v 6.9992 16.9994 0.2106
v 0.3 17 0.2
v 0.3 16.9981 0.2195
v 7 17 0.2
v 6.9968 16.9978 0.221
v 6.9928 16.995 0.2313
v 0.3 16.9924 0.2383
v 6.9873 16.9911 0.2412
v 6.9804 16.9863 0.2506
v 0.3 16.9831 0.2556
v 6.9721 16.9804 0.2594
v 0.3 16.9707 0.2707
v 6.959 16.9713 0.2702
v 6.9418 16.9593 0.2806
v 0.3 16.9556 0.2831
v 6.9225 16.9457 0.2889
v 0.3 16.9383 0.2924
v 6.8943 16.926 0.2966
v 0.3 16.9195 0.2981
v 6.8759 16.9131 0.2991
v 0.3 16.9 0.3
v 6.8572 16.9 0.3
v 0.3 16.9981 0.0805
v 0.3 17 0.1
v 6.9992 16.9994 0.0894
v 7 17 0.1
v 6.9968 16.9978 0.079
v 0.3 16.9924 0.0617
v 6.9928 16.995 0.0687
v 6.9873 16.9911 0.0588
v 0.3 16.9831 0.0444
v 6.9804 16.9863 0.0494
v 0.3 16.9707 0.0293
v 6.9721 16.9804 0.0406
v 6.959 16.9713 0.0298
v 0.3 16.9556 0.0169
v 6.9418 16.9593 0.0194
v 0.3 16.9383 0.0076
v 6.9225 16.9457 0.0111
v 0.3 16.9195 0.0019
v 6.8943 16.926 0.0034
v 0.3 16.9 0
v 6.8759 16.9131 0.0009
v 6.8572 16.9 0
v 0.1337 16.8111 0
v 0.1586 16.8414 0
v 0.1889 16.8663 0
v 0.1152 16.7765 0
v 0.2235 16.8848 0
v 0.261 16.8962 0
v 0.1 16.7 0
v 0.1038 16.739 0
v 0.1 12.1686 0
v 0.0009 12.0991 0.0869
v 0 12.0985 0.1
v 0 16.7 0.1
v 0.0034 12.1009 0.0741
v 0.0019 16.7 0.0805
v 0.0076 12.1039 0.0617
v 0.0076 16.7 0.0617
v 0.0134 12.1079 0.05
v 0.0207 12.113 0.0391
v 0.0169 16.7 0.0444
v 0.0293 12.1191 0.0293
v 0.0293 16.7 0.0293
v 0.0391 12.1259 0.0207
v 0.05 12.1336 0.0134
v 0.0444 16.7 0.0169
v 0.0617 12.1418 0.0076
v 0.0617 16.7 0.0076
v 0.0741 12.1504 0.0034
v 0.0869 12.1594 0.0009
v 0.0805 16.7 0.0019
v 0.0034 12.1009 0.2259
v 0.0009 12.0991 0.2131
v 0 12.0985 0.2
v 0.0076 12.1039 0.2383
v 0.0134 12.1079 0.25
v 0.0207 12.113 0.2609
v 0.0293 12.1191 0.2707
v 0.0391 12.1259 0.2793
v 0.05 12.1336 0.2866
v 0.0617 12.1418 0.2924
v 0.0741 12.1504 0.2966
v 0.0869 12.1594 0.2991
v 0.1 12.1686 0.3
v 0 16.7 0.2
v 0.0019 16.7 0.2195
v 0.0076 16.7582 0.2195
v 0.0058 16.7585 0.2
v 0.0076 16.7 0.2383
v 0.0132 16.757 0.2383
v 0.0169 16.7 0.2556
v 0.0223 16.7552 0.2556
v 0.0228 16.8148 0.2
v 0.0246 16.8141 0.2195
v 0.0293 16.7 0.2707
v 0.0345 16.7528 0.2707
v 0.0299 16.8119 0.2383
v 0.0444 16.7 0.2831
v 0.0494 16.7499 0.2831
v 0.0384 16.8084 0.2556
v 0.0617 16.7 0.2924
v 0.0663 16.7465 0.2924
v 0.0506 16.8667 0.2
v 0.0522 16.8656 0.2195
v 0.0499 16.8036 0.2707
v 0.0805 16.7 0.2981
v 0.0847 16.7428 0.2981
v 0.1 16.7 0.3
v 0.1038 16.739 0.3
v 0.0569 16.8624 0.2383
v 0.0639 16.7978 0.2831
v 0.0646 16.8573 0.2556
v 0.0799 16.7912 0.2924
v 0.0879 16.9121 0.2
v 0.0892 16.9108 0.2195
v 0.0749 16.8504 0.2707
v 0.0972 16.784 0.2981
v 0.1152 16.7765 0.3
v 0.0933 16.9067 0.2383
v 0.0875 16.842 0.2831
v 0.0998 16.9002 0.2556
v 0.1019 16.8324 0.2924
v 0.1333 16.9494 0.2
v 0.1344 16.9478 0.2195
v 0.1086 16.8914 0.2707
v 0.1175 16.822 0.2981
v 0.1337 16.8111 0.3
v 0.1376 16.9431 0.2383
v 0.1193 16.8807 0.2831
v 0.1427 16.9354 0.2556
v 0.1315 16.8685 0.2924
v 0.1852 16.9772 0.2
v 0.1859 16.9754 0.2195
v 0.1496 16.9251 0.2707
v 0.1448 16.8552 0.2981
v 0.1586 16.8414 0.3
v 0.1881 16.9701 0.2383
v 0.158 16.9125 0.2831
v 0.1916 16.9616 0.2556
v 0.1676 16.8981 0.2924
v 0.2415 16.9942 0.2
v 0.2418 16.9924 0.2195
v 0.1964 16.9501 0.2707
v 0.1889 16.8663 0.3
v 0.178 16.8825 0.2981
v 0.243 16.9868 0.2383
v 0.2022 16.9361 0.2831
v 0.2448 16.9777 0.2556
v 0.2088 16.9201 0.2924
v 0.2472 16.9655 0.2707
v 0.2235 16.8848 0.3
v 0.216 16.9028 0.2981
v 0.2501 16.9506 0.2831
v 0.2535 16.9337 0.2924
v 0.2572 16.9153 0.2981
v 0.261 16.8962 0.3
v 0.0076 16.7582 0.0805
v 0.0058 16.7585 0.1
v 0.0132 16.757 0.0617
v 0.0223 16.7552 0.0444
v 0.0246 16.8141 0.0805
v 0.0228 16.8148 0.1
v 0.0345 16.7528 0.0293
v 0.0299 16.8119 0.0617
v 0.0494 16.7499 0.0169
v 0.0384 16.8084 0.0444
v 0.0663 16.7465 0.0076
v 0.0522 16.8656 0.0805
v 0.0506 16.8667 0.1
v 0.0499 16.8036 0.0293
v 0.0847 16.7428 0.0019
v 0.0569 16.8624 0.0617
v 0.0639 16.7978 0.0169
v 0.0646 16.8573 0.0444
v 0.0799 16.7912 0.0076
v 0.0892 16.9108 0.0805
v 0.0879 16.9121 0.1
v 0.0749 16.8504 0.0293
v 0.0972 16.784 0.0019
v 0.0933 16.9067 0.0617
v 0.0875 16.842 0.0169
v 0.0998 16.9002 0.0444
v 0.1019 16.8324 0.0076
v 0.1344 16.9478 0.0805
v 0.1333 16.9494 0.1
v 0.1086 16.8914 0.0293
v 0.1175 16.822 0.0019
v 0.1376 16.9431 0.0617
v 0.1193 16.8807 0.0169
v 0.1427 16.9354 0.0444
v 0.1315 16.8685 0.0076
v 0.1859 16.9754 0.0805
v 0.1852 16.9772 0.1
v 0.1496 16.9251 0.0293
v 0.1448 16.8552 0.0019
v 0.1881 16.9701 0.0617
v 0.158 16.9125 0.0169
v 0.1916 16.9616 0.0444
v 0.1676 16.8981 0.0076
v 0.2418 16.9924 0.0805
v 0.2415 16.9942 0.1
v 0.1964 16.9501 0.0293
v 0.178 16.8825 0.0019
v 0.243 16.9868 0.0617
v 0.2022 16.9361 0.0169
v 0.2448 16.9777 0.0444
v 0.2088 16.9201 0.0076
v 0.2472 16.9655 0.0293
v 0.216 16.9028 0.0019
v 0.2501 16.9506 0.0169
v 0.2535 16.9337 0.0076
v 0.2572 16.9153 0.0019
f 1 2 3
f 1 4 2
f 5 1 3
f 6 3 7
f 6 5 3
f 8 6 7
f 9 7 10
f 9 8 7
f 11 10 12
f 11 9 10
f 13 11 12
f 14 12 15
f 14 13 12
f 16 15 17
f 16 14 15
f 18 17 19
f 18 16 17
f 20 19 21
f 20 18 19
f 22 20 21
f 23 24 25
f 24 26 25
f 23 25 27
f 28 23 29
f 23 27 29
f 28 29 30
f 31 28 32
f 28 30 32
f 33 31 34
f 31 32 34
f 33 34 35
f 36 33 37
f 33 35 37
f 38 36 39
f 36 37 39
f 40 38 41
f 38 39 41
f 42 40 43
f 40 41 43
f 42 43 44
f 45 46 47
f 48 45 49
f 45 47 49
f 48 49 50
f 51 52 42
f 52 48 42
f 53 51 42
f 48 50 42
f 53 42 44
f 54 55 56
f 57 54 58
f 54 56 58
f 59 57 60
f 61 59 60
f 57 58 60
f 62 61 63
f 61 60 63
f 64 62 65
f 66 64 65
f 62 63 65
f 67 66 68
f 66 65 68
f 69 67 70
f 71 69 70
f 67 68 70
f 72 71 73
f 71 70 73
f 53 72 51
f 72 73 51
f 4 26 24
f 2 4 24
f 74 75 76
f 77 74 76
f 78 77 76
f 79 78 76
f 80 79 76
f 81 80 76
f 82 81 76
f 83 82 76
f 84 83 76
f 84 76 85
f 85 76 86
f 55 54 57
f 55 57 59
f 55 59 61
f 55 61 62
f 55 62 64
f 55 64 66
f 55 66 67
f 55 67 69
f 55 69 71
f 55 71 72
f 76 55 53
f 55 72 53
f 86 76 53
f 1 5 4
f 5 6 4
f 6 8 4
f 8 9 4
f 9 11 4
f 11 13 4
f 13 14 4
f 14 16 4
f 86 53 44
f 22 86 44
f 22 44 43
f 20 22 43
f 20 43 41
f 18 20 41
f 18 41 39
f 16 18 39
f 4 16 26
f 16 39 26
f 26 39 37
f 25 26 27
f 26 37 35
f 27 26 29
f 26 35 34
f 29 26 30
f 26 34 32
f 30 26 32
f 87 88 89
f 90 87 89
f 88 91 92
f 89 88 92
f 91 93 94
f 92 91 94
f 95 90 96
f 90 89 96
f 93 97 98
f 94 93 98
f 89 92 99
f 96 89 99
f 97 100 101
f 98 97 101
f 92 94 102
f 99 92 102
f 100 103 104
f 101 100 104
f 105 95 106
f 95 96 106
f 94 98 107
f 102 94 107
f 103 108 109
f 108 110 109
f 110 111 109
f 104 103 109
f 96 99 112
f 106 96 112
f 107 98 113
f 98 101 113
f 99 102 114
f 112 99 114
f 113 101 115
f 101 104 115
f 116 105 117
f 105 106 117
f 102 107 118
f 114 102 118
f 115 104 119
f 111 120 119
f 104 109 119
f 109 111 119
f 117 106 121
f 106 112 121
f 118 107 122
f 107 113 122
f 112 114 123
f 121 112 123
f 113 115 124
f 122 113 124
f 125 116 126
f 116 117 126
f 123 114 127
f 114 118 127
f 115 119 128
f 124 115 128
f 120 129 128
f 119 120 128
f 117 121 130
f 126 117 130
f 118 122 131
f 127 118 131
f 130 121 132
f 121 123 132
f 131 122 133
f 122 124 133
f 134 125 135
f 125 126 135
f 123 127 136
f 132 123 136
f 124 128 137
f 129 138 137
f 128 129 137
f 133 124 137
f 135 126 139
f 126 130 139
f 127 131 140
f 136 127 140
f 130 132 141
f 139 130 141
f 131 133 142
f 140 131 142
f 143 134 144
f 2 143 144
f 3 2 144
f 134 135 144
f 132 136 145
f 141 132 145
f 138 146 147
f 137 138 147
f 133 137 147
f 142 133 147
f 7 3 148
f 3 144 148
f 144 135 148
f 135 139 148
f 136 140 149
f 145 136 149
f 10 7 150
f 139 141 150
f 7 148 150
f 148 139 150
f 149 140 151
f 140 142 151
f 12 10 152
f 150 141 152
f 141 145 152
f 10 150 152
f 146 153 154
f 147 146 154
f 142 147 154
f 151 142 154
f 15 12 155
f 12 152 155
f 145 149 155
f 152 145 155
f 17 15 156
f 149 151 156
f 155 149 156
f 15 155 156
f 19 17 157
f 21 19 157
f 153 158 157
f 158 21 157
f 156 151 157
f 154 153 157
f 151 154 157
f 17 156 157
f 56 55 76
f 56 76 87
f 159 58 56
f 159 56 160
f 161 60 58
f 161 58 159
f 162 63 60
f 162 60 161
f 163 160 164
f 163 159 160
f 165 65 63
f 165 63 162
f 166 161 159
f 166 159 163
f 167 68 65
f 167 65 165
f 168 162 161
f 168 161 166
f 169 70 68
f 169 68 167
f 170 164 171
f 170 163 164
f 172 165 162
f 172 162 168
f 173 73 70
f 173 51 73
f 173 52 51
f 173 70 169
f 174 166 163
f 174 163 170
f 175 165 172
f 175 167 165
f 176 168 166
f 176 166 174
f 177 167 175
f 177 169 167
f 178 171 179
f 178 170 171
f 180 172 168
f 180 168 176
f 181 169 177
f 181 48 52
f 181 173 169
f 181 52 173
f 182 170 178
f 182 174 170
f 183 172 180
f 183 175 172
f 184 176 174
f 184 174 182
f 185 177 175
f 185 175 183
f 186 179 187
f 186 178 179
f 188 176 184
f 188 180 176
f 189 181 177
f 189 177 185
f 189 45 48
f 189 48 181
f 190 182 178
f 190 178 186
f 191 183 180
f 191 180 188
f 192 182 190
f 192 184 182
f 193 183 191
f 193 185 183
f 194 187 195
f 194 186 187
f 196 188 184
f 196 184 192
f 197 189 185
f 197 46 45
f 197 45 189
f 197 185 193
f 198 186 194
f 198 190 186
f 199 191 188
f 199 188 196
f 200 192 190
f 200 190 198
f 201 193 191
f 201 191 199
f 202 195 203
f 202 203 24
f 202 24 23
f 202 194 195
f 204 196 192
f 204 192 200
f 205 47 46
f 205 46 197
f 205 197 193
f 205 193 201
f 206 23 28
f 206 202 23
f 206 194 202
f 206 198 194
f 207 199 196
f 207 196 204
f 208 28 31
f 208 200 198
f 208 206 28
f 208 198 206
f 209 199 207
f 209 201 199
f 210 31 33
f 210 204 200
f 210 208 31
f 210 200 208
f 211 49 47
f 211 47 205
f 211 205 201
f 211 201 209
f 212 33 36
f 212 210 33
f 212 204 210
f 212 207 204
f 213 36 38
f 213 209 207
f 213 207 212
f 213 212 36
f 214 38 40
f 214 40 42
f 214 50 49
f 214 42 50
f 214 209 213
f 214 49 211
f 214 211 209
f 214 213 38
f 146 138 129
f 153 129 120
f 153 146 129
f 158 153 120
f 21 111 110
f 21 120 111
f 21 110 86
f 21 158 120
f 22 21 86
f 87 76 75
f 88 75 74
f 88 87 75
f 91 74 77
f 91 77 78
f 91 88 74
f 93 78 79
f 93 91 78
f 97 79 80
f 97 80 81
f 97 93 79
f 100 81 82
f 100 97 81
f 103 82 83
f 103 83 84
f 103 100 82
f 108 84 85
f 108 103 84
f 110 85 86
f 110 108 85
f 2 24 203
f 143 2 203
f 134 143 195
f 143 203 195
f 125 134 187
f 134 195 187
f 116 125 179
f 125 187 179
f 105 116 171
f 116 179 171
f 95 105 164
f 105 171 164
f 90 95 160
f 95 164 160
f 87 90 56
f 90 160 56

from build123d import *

# Parameters (mm, degrees)
PAD001_DEPTH = 0.3
FILLET004_R  = 0.1
FILLET005_R  = 0.1


with BuildPart() as part:
    # Sketch002 → Pad001 (new body)
    with BuildSketch(Plane.XY):
        with BuildLine():
            Line((0, 12.098547), (7, 17))
            Line((7, 17), (0.3, 17))
            ThreePointArc((0.3, 17), (0.087868, 16.912132), (0, 16.7))
            Line((0, 12.098547), (0, 16.7))
        make_face()
    extrude(amount=PAD001_DEPTH)

    # Fillet004
    fillet004_edges = [part.edges().sort_by_distance(p)[0] for p in [
        (0, 14.399274, 0.3),
        (0.087868, 16.912132, 0.3),
        (3.65, 17, 0.3),
    ]]
    fillet(fillet004_edges, radius=FILLET004_R)

    # Fillet005
    fillet005_edges = [part.edges().sort_by_distance(p)[0] for p in [
        (0, 14.399274, 0),
        (0.087868, 16.912132, 0),
        (3.65, 17, 0),
    ]]
    fillet(fillet005_edges, radius=FILLET005_R)


solid = part.part
